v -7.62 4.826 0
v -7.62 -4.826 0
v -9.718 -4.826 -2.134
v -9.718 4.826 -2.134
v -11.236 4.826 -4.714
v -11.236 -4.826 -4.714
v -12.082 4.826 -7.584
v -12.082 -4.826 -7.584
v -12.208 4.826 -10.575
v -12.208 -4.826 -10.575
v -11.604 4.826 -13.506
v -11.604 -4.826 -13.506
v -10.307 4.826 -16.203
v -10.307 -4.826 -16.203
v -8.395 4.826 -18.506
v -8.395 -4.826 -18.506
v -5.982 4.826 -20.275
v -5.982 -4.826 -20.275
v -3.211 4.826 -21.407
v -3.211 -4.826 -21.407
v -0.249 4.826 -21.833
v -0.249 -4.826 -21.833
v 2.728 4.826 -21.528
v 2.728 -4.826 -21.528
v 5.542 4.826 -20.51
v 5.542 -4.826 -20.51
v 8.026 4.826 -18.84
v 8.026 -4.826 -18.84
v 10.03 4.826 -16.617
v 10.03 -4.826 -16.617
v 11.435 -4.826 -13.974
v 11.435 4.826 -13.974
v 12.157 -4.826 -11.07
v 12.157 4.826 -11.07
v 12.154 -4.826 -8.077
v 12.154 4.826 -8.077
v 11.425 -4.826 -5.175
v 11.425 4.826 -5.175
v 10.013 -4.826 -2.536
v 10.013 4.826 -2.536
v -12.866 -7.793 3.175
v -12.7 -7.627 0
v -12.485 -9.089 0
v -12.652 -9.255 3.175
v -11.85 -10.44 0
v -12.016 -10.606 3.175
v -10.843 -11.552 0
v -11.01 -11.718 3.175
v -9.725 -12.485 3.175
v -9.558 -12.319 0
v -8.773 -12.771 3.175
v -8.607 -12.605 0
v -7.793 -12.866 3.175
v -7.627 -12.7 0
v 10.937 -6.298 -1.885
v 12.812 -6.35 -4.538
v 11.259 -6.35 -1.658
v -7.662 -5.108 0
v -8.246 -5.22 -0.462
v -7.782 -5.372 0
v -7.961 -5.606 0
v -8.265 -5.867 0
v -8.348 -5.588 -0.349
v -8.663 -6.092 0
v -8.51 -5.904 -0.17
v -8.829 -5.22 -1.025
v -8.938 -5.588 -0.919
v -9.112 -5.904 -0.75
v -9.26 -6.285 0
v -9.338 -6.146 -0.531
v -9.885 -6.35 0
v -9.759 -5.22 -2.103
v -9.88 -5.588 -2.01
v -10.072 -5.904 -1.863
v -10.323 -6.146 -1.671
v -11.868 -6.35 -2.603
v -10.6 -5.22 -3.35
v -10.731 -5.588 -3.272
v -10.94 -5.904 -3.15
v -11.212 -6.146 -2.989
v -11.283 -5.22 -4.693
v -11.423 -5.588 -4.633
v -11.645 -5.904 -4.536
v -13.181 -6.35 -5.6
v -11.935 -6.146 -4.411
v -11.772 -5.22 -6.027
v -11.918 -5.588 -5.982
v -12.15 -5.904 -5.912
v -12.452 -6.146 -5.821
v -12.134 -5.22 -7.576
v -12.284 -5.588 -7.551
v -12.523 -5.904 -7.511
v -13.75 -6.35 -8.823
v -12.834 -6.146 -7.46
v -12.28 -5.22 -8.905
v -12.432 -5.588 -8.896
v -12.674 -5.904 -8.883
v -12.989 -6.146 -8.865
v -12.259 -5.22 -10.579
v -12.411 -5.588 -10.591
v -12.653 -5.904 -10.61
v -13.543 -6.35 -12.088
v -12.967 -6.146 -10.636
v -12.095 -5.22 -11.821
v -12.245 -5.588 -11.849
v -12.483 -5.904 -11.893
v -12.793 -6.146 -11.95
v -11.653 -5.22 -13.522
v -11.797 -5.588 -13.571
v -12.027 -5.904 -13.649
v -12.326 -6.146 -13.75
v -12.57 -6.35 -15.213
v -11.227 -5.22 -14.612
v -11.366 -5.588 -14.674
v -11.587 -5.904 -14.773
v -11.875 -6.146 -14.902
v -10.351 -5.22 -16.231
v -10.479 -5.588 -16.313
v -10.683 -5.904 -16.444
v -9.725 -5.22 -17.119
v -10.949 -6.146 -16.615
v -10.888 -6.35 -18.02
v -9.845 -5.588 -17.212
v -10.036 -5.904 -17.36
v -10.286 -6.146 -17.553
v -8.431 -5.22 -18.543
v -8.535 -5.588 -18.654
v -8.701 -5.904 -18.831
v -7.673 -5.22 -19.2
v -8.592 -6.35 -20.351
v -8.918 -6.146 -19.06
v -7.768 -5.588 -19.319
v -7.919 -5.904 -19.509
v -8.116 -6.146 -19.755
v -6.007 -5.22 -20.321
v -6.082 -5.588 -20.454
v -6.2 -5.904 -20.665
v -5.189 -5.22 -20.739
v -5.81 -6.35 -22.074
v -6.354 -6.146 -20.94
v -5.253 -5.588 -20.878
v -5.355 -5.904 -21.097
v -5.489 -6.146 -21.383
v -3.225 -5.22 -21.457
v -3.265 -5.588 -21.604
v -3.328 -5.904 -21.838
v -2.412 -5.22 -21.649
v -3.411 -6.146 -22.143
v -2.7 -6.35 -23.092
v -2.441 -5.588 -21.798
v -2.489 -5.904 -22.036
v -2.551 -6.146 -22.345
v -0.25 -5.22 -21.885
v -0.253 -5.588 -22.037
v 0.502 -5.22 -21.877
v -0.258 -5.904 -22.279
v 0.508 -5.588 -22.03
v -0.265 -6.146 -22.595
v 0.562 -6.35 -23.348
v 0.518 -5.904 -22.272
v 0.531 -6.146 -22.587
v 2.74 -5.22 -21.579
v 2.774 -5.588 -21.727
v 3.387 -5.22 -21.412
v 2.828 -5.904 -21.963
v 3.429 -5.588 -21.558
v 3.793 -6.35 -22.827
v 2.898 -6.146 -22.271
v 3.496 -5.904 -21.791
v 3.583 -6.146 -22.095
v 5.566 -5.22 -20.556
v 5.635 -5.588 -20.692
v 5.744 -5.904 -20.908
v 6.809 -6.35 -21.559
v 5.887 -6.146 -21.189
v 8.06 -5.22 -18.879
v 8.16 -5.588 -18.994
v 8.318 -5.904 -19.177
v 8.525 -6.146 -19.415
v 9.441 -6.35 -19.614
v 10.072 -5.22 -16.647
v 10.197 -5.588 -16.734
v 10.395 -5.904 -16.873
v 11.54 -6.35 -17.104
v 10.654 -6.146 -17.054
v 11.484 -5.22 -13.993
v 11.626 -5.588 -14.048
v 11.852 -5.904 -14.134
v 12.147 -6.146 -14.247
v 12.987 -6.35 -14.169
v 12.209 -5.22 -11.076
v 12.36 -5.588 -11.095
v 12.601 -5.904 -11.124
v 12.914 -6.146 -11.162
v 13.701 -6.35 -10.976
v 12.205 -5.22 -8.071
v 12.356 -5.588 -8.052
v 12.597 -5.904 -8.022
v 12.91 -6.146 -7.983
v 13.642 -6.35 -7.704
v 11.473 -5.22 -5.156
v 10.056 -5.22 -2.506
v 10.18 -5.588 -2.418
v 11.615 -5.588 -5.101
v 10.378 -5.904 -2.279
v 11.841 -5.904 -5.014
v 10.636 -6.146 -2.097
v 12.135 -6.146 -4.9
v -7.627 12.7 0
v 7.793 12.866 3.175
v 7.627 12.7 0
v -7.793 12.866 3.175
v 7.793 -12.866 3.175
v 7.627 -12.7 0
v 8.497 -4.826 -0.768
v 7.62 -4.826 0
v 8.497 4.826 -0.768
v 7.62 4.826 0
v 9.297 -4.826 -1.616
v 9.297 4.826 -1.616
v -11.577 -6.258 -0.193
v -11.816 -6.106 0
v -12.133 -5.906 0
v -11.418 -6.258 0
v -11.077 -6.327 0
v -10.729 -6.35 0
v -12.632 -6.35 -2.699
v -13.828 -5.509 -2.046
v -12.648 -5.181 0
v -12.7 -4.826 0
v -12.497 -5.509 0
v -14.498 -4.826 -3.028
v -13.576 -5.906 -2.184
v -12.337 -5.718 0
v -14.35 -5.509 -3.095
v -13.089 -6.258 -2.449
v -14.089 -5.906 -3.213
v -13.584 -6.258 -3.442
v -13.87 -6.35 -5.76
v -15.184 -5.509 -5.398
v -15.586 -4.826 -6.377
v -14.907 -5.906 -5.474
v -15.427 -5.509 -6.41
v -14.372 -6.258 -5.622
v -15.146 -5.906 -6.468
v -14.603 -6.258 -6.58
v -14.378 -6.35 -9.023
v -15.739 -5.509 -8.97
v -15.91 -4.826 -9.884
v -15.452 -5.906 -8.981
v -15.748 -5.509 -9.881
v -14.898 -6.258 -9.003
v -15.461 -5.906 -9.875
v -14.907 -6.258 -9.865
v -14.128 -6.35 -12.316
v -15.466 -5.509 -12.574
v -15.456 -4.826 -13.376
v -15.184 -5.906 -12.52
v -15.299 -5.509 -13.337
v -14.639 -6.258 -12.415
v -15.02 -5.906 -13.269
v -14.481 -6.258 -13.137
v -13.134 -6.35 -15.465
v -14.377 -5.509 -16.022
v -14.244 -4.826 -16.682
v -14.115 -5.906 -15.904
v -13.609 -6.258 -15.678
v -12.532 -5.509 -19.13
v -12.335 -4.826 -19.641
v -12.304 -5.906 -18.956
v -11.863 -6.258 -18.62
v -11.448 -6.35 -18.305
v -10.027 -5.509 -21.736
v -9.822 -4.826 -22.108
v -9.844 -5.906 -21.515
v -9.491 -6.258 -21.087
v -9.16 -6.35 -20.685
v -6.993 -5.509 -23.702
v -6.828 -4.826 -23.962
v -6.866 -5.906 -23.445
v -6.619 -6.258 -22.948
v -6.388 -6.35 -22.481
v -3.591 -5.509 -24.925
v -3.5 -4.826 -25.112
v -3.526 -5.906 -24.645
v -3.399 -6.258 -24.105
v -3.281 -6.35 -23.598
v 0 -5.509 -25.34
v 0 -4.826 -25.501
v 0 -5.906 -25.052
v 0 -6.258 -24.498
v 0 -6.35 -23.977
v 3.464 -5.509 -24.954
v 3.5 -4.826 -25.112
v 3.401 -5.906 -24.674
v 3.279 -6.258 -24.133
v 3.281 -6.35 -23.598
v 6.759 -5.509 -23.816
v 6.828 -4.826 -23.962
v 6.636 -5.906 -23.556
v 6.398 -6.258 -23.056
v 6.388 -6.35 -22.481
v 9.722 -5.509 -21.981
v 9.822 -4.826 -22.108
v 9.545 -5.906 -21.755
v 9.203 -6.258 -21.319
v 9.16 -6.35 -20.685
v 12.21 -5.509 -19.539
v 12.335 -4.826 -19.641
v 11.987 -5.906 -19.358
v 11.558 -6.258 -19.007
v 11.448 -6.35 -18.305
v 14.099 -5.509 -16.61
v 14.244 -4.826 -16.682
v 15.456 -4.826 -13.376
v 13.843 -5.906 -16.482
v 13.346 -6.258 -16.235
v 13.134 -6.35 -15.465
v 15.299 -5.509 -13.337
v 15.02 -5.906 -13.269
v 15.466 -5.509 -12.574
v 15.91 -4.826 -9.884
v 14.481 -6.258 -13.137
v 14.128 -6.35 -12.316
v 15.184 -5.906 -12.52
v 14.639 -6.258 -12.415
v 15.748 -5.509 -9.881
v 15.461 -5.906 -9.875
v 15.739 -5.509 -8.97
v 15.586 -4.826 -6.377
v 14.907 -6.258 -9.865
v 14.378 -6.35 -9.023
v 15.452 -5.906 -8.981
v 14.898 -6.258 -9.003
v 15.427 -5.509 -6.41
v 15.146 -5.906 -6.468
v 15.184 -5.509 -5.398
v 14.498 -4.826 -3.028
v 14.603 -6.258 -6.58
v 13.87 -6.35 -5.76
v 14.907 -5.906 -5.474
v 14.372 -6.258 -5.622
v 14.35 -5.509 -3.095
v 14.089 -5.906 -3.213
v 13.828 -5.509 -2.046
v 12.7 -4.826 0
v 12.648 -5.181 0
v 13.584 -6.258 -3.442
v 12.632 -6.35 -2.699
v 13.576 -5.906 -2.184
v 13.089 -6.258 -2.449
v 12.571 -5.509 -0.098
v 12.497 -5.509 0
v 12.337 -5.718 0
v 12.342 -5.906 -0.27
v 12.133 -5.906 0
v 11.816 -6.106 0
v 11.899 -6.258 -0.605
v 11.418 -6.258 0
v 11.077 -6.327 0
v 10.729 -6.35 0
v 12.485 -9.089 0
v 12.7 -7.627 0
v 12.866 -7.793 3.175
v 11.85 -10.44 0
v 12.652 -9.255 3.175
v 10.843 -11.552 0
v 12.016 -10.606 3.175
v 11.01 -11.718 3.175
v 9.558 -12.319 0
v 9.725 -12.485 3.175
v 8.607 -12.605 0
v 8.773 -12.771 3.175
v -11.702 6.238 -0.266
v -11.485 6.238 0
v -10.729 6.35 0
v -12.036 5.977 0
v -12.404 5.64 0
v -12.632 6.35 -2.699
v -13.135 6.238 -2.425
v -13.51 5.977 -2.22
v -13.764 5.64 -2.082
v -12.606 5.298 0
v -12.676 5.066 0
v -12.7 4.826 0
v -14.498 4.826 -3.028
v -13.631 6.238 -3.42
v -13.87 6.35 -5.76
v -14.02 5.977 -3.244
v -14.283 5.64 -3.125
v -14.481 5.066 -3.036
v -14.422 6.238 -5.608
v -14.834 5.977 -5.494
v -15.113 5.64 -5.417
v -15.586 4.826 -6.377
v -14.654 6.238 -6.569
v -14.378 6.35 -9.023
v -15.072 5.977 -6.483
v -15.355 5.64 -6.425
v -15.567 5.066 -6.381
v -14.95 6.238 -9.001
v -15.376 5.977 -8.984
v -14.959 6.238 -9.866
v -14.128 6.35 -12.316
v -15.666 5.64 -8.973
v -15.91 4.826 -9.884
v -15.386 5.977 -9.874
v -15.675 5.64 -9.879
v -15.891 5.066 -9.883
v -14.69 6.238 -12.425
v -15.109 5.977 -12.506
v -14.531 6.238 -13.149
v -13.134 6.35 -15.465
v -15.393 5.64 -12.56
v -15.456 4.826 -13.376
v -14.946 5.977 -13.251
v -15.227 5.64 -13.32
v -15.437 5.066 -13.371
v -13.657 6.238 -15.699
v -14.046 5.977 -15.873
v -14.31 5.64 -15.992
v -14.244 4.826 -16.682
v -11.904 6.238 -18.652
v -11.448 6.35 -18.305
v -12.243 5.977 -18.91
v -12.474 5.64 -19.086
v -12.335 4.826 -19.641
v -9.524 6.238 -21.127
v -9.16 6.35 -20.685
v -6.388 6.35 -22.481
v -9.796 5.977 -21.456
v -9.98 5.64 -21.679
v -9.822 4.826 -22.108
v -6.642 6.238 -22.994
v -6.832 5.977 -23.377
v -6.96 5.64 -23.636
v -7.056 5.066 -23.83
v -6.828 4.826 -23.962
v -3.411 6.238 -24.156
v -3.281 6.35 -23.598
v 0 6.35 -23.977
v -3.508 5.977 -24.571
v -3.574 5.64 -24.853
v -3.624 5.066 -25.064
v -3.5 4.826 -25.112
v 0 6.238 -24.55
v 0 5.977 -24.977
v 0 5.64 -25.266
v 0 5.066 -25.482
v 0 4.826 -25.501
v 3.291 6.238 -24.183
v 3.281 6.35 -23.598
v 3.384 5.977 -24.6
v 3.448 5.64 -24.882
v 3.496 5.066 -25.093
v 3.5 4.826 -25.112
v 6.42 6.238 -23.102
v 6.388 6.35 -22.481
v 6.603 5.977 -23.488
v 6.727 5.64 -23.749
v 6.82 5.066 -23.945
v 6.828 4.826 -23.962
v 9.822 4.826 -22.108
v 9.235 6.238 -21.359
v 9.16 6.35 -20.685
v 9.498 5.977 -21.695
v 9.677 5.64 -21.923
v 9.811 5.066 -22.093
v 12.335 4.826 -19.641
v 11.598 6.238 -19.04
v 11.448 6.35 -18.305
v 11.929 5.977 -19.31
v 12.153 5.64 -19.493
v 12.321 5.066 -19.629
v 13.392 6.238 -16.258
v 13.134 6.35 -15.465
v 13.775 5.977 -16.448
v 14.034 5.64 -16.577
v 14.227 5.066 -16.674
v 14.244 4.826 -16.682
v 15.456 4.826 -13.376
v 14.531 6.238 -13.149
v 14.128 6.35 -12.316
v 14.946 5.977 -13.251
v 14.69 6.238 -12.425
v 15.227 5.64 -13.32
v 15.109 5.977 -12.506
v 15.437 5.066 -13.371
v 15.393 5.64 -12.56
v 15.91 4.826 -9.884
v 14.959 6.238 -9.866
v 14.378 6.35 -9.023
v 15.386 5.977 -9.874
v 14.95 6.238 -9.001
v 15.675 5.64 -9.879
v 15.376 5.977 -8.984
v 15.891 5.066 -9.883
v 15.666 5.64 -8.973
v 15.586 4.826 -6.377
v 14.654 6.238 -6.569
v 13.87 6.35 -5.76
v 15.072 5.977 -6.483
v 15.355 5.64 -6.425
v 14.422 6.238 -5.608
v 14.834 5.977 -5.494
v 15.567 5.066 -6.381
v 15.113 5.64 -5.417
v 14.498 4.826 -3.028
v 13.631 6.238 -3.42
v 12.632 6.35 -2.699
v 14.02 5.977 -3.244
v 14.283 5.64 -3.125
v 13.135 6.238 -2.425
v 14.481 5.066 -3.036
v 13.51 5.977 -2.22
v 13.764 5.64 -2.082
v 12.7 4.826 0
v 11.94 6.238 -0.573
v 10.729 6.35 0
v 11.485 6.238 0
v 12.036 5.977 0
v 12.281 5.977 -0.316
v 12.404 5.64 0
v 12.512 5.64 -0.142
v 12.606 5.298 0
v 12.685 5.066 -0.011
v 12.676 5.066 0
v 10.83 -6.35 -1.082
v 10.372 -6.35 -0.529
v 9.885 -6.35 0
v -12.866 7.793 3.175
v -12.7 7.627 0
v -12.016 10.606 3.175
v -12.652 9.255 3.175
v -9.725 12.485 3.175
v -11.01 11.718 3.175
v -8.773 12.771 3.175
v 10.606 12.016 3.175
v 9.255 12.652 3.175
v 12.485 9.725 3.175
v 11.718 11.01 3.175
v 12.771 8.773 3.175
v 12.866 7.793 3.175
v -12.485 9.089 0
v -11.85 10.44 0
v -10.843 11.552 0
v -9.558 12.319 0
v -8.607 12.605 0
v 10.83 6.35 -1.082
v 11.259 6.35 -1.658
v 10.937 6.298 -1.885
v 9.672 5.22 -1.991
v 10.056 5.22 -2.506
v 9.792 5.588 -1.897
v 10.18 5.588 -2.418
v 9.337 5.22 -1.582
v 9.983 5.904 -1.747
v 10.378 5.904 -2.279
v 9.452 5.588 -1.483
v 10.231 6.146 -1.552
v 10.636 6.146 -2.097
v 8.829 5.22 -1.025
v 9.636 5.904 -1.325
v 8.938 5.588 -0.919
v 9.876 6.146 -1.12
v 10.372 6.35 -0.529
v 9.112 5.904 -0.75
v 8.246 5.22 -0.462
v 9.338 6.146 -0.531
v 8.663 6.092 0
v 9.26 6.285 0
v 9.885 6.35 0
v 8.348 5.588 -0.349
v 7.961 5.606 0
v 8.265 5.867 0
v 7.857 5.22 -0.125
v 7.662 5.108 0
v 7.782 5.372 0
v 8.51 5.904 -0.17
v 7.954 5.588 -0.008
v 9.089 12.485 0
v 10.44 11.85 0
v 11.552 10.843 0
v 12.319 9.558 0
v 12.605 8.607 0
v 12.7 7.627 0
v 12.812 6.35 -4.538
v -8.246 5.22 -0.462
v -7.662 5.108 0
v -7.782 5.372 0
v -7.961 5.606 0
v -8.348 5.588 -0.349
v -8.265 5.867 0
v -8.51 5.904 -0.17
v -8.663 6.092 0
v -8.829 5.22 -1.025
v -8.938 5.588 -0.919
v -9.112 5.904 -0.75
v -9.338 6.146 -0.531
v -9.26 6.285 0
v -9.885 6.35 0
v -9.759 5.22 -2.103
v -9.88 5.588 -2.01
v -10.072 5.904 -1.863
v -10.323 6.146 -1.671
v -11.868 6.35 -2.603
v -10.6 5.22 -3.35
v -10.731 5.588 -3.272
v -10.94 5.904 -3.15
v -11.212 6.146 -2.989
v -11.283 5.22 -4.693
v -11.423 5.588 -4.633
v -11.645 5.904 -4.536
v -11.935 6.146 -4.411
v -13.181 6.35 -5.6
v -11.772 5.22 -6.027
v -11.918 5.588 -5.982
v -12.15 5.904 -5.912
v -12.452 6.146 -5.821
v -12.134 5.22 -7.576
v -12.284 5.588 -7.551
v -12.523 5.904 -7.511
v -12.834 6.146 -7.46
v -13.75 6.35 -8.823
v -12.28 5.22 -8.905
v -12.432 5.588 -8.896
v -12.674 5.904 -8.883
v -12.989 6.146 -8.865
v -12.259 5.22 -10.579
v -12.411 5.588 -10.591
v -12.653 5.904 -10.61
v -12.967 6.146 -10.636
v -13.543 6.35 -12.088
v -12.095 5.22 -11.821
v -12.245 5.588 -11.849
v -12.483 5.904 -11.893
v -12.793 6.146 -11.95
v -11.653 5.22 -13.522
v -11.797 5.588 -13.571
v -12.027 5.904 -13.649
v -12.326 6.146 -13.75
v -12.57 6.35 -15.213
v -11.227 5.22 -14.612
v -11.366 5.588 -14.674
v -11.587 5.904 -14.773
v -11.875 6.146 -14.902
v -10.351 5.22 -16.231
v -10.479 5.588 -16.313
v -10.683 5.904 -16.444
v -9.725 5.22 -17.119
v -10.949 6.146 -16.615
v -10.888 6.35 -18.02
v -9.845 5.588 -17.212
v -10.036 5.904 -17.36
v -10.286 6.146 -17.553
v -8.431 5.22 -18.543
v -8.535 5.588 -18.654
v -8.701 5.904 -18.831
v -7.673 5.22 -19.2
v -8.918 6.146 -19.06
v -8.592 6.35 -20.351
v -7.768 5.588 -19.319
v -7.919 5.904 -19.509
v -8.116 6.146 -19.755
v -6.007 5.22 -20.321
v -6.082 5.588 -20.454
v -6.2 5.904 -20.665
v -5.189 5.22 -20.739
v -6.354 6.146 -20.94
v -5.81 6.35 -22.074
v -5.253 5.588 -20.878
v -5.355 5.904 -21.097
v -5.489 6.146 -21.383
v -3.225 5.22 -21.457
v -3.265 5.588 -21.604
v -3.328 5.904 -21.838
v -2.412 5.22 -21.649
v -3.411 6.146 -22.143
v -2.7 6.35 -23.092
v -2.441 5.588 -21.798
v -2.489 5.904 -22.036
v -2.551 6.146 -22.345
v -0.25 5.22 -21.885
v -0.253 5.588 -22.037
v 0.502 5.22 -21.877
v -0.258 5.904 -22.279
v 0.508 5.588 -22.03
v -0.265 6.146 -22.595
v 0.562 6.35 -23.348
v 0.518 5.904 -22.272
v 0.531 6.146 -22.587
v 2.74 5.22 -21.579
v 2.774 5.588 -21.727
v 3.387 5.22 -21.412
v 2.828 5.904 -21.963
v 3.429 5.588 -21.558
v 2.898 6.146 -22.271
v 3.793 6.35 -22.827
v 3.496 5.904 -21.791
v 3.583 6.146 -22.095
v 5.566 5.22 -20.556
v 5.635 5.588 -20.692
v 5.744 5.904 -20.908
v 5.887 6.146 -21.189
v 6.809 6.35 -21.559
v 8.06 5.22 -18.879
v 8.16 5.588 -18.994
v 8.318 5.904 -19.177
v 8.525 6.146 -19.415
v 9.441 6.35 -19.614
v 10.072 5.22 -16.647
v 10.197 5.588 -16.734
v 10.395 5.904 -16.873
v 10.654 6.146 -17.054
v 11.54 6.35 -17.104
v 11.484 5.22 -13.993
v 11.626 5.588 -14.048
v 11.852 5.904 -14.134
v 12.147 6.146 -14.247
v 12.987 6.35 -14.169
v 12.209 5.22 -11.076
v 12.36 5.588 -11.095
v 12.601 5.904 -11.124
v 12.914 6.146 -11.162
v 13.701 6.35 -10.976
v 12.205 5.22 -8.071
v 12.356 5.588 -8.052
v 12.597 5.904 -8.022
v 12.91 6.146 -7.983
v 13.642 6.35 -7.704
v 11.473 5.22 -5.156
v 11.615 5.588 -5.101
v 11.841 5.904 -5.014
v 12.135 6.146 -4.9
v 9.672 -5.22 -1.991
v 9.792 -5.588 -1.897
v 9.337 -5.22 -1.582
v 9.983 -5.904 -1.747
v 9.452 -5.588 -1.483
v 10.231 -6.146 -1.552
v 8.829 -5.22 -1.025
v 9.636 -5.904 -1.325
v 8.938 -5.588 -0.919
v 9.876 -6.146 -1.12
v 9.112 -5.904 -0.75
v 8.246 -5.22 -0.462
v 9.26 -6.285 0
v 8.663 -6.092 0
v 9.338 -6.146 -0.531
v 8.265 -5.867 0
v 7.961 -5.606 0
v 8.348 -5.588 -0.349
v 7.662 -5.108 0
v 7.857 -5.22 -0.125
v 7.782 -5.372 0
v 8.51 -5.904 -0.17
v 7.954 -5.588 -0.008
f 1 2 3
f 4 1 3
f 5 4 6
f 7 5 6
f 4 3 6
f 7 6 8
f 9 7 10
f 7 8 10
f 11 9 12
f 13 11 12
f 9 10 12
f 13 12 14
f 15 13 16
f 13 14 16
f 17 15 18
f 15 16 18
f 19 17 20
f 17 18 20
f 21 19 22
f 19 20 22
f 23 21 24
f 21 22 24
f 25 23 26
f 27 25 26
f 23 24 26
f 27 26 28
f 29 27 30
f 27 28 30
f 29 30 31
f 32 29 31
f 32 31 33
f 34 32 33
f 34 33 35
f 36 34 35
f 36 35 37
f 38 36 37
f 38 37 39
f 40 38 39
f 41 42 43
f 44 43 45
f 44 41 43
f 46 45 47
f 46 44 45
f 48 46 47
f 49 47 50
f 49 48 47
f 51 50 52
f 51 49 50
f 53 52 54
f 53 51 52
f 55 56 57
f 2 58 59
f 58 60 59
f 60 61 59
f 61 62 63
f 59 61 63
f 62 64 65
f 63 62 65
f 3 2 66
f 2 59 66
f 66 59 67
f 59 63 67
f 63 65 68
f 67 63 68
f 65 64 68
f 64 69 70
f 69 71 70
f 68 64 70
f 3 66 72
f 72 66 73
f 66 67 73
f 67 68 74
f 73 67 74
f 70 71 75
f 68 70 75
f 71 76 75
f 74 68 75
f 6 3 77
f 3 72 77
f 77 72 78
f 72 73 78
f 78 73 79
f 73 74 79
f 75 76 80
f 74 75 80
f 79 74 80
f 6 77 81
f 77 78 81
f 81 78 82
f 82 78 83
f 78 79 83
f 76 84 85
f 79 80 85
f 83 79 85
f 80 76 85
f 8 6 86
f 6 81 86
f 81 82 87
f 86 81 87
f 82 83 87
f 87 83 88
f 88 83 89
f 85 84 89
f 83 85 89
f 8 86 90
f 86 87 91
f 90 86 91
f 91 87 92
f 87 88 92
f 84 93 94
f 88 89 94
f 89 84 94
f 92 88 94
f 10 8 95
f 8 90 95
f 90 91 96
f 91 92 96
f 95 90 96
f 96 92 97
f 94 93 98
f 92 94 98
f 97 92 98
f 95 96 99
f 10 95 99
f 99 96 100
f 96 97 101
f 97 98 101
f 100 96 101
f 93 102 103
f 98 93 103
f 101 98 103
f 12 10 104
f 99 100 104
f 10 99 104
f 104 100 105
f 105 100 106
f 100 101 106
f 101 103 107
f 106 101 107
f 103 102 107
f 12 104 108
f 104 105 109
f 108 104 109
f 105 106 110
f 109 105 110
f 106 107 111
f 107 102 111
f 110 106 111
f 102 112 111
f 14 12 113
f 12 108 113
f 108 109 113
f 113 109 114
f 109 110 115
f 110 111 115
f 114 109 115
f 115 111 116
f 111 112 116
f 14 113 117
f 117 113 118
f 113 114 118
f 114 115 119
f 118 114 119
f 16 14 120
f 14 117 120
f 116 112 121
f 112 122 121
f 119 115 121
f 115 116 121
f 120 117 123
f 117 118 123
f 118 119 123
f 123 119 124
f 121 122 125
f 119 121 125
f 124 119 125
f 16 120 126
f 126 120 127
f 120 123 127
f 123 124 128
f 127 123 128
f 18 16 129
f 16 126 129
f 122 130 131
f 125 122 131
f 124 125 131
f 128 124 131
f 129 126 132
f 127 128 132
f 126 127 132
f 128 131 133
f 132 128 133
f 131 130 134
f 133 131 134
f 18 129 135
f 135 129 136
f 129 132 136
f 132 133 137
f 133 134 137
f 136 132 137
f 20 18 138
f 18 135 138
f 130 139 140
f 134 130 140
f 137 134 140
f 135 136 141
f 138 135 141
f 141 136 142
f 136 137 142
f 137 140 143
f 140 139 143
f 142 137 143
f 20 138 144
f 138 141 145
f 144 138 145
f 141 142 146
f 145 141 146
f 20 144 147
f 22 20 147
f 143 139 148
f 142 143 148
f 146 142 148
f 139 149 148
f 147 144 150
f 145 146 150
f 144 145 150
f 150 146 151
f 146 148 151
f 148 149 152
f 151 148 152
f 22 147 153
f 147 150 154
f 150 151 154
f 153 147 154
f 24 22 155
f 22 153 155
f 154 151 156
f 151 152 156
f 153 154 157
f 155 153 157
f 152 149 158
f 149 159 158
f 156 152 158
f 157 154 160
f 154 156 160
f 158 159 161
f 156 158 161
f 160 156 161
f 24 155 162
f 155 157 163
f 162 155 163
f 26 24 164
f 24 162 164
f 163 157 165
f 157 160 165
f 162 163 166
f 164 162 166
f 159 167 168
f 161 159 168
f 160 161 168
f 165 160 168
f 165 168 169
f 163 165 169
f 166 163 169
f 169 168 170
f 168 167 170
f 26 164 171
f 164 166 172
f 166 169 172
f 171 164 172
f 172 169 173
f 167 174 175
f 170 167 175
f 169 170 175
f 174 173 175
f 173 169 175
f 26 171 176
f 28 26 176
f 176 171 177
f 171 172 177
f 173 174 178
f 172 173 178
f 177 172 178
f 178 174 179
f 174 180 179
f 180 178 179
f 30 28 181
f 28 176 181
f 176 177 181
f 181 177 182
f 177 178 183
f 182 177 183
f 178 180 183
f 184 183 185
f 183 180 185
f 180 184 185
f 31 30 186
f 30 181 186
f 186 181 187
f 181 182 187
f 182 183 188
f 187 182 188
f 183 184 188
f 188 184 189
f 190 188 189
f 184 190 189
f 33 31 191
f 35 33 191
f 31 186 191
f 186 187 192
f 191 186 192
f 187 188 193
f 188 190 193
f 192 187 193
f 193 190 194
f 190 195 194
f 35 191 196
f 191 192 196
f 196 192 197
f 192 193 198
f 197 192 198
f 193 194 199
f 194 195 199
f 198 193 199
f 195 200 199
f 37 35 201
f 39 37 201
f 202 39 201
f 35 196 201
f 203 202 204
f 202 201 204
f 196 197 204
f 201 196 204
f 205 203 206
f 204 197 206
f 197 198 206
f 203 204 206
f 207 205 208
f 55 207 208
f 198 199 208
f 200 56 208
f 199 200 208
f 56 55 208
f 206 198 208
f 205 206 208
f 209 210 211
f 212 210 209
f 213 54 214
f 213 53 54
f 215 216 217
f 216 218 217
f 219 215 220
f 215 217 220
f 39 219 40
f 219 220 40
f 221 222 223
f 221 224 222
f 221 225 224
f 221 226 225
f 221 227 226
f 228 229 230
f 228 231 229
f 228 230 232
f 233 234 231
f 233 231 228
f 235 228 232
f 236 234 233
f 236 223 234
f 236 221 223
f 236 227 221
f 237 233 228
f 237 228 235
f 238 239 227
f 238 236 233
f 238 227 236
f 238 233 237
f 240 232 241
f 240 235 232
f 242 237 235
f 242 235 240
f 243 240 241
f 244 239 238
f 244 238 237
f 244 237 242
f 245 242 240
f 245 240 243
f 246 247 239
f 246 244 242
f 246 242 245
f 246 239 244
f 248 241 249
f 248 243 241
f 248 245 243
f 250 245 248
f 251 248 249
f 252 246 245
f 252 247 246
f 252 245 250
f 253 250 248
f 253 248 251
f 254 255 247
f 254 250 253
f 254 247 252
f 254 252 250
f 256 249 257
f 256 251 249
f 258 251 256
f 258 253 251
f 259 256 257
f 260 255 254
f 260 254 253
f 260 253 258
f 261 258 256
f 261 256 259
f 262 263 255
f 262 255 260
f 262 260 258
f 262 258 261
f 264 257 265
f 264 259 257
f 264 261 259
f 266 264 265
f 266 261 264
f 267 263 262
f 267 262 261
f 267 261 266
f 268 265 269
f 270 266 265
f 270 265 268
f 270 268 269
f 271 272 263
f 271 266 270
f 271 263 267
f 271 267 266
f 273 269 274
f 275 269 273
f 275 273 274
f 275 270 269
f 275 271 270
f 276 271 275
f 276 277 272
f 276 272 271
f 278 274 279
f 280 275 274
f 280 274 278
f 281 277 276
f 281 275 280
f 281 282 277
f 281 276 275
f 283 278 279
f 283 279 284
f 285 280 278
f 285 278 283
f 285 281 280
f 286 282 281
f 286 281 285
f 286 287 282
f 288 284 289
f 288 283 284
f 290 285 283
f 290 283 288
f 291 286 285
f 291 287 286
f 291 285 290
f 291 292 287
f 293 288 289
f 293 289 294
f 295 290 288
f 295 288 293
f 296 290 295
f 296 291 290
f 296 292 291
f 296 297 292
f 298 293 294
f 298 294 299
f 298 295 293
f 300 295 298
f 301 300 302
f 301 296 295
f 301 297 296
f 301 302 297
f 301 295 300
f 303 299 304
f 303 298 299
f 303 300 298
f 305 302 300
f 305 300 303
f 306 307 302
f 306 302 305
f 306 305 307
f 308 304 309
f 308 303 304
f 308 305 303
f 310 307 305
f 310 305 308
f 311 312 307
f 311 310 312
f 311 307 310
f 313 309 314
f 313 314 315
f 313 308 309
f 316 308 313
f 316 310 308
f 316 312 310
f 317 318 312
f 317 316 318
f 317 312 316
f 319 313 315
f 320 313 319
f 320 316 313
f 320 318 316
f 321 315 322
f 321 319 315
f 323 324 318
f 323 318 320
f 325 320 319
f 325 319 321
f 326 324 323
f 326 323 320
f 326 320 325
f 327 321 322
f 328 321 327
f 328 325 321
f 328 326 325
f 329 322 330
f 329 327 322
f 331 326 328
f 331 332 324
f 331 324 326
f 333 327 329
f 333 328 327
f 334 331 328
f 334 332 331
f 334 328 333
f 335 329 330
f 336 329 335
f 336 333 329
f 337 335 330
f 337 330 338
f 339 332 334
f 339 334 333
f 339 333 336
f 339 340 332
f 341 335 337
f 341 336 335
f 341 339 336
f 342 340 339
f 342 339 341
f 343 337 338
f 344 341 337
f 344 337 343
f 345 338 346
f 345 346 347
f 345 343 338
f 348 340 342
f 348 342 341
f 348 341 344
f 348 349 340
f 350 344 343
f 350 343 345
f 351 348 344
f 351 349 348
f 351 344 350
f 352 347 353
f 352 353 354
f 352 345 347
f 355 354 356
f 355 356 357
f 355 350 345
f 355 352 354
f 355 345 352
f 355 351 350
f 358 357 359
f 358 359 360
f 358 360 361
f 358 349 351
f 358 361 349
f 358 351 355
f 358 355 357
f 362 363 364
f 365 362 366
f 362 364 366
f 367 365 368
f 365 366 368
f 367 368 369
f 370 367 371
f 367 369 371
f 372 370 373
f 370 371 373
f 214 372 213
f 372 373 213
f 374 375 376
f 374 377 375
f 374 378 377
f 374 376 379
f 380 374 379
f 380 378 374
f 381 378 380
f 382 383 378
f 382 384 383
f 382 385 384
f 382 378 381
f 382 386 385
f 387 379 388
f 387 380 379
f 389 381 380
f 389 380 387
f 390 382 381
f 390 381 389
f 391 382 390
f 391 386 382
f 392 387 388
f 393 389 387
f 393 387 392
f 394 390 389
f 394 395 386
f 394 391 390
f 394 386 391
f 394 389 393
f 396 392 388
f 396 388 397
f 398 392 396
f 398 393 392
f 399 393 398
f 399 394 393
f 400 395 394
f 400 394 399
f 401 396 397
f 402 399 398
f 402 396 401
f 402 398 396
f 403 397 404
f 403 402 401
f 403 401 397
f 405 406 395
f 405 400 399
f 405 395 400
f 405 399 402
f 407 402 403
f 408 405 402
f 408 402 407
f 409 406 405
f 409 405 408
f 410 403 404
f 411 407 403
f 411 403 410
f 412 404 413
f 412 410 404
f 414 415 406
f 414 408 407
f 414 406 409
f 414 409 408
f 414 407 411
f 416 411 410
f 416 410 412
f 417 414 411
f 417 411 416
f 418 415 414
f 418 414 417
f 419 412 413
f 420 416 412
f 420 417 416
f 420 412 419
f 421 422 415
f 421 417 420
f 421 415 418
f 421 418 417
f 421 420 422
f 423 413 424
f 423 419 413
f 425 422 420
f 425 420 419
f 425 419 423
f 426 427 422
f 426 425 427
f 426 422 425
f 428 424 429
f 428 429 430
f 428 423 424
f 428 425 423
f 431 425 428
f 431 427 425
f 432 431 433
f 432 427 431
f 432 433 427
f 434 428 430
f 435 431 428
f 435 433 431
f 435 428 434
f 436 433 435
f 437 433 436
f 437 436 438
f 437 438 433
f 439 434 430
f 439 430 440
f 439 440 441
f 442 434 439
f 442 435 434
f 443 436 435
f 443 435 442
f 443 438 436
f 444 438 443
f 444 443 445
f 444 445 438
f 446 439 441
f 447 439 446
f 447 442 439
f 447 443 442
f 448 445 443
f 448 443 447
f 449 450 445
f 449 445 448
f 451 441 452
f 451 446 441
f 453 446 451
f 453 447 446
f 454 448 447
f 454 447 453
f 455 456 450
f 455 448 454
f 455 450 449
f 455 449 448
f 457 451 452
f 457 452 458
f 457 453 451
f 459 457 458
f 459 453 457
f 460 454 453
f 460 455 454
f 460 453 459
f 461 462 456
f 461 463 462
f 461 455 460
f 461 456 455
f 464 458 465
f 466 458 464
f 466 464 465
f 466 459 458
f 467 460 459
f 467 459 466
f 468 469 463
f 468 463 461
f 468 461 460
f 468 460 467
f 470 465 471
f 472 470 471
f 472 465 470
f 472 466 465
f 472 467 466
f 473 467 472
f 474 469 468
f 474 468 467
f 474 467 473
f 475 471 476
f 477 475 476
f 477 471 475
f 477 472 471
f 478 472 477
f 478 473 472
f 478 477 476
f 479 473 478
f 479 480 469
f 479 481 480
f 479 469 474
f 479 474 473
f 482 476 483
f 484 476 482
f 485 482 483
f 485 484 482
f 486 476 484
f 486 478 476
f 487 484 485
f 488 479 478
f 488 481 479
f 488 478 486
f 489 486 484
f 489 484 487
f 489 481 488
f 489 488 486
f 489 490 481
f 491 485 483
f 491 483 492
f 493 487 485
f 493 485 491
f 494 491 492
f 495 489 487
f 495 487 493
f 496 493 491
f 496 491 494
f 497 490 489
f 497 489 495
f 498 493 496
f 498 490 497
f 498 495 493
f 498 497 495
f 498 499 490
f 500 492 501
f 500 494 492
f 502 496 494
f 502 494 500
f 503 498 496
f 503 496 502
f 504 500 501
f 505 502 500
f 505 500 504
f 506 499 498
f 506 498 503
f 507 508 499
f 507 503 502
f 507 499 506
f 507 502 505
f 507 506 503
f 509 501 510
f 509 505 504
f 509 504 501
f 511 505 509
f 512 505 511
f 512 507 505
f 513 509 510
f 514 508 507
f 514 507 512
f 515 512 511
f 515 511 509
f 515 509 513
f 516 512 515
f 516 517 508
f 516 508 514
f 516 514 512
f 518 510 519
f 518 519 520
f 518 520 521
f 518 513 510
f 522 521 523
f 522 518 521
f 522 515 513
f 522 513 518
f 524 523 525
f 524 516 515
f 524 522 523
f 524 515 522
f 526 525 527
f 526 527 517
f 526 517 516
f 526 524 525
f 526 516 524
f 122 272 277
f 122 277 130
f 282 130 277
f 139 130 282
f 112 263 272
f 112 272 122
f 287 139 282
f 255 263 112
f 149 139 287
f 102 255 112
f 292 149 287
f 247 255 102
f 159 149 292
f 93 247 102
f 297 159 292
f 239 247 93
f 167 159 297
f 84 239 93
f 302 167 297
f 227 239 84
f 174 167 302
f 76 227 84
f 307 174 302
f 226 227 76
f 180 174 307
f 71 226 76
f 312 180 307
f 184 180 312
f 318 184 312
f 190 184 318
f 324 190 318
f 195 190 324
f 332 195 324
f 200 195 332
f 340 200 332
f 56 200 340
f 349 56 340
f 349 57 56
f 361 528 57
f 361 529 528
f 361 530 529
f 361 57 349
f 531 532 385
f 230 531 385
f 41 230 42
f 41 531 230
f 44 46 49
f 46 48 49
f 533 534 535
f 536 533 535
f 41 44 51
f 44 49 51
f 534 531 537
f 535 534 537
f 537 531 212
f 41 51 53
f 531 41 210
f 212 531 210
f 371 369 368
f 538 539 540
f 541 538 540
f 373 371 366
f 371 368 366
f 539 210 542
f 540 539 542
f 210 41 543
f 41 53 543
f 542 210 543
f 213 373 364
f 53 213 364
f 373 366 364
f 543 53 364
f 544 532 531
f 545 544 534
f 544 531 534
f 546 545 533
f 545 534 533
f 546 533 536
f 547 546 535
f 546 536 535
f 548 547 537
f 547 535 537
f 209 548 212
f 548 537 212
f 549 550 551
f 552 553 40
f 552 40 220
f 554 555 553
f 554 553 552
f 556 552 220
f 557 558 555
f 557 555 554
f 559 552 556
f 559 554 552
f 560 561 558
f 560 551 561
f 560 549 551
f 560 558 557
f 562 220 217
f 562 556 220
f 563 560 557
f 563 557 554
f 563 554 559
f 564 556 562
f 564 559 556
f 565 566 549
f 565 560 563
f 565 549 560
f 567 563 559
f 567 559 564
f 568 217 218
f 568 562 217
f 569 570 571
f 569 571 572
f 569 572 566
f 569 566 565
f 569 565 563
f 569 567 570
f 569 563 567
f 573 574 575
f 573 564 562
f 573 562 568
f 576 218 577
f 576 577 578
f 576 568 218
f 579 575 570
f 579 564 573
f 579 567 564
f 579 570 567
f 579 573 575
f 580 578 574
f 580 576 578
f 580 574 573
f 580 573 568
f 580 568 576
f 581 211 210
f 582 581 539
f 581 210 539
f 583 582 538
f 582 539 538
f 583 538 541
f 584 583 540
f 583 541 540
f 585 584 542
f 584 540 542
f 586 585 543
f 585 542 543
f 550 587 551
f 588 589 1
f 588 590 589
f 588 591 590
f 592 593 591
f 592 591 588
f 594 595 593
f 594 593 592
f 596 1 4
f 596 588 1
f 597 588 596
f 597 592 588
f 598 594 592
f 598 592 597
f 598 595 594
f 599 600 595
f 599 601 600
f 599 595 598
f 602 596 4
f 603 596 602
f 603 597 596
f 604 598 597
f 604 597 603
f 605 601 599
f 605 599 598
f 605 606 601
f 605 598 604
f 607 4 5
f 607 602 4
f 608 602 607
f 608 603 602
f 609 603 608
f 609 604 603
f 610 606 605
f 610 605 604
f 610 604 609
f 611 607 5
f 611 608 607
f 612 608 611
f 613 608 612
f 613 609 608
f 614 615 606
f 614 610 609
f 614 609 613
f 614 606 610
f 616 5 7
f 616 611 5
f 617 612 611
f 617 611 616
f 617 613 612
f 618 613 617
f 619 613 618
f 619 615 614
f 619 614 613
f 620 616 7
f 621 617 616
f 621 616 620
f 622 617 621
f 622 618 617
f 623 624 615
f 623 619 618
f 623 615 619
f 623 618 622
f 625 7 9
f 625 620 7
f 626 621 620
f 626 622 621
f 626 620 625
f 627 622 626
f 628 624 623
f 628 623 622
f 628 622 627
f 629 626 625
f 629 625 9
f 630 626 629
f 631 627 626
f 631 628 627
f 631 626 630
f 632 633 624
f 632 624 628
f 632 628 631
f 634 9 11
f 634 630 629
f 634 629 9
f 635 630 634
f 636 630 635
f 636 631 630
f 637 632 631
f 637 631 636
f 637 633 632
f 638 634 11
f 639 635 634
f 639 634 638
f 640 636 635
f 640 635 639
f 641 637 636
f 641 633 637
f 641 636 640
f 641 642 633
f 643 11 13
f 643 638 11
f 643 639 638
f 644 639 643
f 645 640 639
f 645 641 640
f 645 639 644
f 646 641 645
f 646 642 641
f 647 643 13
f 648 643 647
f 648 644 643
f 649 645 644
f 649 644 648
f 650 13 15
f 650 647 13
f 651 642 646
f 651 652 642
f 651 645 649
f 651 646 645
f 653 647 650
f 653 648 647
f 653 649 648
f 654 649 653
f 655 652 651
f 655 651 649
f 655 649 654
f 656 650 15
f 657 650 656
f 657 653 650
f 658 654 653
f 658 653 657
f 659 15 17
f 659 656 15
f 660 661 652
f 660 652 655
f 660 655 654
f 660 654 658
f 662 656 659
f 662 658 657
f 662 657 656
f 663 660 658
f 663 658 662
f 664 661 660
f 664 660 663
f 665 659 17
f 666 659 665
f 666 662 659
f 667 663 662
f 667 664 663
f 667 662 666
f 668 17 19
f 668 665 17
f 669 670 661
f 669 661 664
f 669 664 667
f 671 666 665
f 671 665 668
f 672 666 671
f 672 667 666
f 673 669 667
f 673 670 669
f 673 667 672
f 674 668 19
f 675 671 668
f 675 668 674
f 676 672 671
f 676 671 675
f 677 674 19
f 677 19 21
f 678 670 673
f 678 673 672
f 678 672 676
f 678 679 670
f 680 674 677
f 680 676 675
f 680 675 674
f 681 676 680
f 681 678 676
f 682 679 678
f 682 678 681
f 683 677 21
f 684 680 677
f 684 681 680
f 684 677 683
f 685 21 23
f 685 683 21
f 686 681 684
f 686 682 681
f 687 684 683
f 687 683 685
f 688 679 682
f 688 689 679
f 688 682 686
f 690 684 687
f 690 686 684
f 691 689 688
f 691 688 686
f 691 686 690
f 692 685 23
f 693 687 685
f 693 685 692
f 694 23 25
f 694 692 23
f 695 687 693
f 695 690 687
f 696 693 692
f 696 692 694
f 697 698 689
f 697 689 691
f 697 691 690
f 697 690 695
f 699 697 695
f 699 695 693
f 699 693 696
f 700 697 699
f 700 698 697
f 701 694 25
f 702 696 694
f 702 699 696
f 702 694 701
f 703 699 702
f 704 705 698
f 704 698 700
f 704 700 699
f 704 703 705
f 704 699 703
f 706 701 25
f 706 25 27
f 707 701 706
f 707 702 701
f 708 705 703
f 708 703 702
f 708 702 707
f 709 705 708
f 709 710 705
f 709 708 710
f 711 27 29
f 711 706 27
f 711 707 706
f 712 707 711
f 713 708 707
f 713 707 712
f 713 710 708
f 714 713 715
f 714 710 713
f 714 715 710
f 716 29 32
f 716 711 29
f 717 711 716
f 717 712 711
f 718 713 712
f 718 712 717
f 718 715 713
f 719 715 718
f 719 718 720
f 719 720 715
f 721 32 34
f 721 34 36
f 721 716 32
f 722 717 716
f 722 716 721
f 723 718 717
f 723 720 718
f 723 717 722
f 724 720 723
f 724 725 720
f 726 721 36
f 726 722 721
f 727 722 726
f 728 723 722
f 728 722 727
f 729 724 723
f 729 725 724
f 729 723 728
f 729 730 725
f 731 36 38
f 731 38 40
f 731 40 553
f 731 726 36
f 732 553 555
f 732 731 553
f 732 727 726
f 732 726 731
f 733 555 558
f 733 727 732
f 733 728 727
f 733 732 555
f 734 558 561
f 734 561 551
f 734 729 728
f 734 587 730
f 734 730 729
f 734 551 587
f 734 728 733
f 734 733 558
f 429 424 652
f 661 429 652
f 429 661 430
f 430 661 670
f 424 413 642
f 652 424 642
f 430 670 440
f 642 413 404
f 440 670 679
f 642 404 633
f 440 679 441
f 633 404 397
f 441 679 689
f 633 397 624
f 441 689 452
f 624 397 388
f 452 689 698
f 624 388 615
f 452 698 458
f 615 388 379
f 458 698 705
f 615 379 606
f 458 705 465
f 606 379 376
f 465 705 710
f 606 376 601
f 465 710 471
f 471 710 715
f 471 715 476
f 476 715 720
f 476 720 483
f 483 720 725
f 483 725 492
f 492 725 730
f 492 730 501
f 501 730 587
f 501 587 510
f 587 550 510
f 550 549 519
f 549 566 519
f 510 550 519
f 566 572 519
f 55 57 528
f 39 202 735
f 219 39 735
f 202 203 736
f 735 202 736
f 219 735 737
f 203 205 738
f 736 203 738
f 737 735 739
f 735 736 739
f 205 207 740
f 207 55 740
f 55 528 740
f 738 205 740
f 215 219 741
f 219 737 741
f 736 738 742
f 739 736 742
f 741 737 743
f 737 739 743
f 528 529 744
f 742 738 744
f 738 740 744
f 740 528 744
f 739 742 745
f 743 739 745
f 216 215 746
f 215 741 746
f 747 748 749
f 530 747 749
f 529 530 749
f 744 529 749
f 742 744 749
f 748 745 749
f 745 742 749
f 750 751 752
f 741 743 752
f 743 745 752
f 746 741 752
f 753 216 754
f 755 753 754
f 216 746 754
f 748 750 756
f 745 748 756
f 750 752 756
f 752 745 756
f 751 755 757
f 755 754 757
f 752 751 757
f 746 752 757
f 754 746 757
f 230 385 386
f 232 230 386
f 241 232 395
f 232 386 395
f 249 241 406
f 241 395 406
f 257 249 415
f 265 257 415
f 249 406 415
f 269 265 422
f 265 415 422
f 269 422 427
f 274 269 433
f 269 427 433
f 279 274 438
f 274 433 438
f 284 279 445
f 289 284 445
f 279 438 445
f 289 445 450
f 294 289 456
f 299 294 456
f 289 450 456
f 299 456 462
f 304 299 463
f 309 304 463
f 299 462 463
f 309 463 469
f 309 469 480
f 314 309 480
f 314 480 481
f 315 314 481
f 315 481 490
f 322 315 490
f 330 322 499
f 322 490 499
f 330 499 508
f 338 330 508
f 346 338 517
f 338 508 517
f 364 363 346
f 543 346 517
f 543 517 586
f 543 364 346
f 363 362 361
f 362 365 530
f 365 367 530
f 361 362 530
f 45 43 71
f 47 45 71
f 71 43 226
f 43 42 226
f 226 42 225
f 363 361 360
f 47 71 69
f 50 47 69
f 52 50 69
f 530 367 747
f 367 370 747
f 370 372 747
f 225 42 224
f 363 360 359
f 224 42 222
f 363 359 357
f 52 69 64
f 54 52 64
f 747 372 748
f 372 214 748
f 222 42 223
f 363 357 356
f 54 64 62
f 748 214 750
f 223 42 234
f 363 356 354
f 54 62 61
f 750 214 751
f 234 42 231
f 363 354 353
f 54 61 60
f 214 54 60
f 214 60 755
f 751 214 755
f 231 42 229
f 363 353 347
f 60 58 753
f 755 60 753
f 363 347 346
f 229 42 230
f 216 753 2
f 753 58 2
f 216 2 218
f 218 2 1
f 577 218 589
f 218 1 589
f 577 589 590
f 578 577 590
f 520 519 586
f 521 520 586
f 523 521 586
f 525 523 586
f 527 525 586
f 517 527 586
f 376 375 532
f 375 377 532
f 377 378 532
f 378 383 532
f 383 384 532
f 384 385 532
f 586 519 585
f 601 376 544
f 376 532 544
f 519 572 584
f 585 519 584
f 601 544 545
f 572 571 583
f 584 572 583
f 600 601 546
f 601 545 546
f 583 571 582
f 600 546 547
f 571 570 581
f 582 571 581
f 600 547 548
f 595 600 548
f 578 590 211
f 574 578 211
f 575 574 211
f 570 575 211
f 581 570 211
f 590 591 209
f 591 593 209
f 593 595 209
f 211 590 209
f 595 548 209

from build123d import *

# Parameters (mm, degrees)
F0_W          = 25.4
F0_H          = 25.4
F1_DEPTH      = 3.175
F1_TAPER      = -3
F3_W          = 5.08
F3_H          = 12.7
F6_DEPTH      = 6.35
F6_DEPTH_BACK = 6.35
F7_R          = 5.08
F8_R          = 1.524


with BuildPart() as f1:
    # F0 (on Top) → F1 (new body)
    with BuildSketch(Plane.XY):
        Rectangle(F0_W, F0_H)
    extrude(amount=F1_DEPTH, taper=F1_TAPER)

    # F4: sweep along a path in F2
    with BuildLine(Plane.XZ) as f4_path:
        ThreePointArc((-10.16, 0), (0, -23.5582897328), (10.16, 0))
    # F3 (on face) → F4 (sweep)
    with BuildSketch(Plane(origin=(0, 0, 0), x_dir=(1, 0, 0), z_dir=(0, 0, -1))):
        with Locations((-10.16, 0)):
            Rectangle(F3_W, F3_H)
    sweep(path=f4_path.line)

    # F5 (on Front) → F6 (join, two sides)
    with BuildSketch(Plane.XZ) as f6_sk:
        with BuildLine():
            Line((10.0130578512, -2.535746045), (10.16, 0))
            Line((10.16, 0), (7.62, 0))
            ThreePointArc((7.62, 0), (8.9072265211, -1.1822790439), (10.0130578512, -2.535746045))
        make_face()
    extrude(amount=F6_DEPTH)
    extrude(f6_sk.sketch, amount=-F6_DEPTH_BACK)

    # F7
    f7_edges = [f1.edges().sort_by_distance(p)[0] for p in [
        (-12.783197, -12.783197, 1.5875),
        (-12.783197, 12.783197, 1.5875),
        (12.783197, 12.783197, 1.5875),
        (12.783197, -12.783197, 1.5875),
    ]]
    fillet(f7_edges, radius=F7_R)

    # F8
    f8_edges = [f1.edges().sort_by_distance(p)[0] for p in [
        (-1.743325, -6.35, -21.711017),
        (8.907227, -6.35, -1.182279),
        (-1.743325, 6.35, -21.711017),
        (0, 6.35, -25.501344),
        (0, -6.35, -25.501344),
        (8.907227, 6.35, -1.182279),
    ]]
    fillet(f8_edges, radius=F8_R)


solid = f1.part
